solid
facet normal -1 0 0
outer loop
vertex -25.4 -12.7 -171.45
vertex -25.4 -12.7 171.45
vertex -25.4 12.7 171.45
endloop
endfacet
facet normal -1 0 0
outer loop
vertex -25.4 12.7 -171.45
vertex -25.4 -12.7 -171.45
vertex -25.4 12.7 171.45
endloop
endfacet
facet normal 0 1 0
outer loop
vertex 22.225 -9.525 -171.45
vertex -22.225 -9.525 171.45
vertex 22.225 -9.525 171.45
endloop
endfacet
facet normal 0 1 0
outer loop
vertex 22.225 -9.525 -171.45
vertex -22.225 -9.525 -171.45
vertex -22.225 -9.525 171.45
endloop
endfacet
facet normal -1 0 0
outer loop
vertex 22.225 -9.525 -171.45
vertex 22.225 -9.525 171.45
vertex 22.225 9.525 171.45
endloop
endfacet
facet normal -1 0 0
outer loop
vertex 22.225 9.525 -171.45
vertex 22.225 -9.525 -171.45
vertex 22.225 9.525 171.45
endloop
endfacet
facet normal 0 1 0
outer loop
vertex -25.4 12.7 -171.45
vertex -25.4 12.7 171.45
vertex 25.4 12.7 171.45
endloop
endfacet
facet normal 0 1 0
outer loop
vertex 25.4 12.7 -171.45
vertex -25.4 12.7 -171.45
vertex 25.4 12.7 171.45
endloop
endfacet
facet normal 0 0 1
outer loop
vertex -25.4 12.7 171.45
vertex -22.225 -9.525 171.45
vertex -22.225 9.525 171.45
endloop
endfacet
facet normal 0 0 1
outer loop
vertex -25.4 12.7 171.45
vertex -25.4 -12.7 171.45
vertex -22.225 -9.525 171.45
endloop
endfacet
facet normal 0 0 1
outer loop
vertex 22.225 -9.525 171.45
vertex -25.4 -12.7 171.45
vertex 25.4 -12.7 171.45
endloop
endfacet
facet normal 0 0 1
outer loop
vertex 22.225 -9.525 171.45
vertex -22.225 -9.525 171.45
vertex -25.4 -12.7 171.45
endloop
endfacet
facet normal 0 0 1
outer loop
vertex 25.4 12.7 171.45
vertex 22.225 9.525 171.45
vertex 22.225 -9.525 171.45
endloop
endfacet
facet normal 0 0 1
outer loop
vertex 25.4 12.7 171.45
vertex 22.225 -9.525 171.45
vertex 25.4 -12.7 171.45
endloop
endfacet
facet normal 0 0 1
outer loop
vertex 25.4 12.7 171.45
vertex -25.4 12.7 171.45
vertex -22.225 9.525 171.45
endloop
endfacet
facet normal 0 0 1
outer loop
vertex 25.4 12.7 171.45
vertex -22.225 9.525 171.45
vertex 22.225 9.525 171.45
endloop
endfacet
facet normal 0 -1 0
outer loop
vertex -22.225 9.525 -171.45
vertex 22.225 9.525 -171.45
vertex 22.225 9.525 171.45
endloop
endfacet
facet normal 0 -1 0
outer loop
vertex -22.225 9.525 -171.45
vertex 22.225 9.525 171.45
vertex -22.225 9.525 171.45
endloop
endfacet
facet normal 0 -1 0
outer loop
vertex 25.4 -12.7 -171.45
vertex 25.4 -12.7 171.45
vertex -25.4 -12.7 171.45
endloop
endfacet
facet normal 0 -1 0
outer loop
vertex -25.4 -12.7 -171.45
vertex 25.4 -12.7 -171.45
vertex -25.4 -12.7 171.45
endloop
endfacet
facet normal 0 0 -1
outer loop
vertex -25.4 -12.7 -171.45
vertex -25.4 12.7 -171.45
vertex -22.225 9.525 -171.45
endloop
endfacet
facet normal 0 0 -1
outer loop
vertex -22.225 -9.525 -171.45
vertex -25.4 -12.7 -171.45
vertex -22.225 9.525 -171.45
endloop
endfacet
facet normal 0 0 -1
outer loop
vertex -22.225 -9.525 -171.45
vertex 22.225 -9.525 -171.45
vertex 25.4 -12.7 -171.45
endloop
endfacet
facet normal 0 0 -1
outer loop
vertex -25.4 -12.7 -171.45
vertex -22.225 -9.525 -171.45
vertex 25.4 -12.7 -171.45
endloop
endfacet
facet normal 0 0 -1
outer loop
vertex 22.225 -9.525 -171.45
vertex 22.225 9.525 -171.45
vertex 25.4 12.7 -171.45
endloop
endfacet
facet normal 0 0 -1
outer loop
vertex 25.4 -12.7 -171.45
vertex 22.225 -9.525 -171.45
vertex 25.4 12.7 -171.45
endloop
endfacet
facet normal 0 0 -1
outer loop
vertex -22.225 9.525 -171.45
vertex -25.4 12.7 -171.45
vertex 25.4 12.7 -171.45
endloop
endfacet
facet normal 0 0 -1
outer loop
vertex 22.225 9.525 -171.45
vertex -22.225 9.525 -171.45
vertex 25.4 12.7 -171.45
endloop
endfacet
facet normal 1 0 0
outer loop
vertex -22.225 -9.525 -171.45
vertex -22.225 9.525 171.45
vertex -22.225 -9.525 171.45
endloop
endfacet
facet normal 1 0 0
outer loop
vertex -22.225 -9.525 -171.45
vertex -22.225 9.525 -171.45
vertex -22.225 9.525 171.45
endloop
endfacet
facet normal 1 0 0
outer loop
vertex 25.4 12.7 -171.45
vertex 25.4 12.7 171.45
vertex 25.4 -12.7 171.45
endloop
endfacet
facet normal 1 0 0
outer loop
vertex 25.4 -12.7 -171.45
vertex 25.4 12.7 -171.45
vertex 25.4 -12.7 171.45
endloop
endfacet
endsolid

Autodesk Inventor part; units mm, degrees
ref_plane "YZ Plane" through (0, 0, 0) normal (1, 0, 0) x (0, 1, 0)
ref_plane "XZ Plane" through (0, 0, 0) normal (0, 1, 0) x (-1, 0, 0)
ref_plane "XY Plane" through (0, 0, 0) normal (0, 0, 1) x (1, 0, 0)
sketch "Sketch1" plane through (0, 0, 0) normal (0, 0, 1) x (1, 0, 0)
  line L0 (-35.56, 0) -> (35.56, 0) projected
  line L1 (0, -17.78) -> (0, 17.78) projected
  line L2 (-25.4, 12.7) -> (25.4, 12.7)
  line L3 (25.4, 12.7) -> (25.4, -12.7)
  line L4 (25.4, -12.7) -> (-25.4, -12.7)
  line L5 (-25.4, -12.7) -> (-25.4, 12.7)
  line L6 (22.225, 9.525) -> (-22.225, 9.525)
  line L7 (-22.225, 9.525) -> (-22.225, -9.525)
  line L8 (-22.225, -9.525) -> (22.225, -9.525)
  line L9 (22.225, -9.525) -> (22.225, 9.525)
  point P0 (0, 0)
  point P1 (-25.4, 0)
  point P2 (0, 12.7)
  dimension "d0" = 25.4
  dimension "d1" = 3.175
  dimension "d7" = 50.8
extrude "Extrusion1" add sketch "Sketch1" along normal mid plane 342.9 contours L5 L2 L1 L6 L7 L0 | L0 L7 L8 L1 L4 L5 | L1 L8 L9 L0 L3 L4 | L2 L3 L0 L9 L6 L1
properties part number "tubing_template_0.125" material "Aluminum-6061"
